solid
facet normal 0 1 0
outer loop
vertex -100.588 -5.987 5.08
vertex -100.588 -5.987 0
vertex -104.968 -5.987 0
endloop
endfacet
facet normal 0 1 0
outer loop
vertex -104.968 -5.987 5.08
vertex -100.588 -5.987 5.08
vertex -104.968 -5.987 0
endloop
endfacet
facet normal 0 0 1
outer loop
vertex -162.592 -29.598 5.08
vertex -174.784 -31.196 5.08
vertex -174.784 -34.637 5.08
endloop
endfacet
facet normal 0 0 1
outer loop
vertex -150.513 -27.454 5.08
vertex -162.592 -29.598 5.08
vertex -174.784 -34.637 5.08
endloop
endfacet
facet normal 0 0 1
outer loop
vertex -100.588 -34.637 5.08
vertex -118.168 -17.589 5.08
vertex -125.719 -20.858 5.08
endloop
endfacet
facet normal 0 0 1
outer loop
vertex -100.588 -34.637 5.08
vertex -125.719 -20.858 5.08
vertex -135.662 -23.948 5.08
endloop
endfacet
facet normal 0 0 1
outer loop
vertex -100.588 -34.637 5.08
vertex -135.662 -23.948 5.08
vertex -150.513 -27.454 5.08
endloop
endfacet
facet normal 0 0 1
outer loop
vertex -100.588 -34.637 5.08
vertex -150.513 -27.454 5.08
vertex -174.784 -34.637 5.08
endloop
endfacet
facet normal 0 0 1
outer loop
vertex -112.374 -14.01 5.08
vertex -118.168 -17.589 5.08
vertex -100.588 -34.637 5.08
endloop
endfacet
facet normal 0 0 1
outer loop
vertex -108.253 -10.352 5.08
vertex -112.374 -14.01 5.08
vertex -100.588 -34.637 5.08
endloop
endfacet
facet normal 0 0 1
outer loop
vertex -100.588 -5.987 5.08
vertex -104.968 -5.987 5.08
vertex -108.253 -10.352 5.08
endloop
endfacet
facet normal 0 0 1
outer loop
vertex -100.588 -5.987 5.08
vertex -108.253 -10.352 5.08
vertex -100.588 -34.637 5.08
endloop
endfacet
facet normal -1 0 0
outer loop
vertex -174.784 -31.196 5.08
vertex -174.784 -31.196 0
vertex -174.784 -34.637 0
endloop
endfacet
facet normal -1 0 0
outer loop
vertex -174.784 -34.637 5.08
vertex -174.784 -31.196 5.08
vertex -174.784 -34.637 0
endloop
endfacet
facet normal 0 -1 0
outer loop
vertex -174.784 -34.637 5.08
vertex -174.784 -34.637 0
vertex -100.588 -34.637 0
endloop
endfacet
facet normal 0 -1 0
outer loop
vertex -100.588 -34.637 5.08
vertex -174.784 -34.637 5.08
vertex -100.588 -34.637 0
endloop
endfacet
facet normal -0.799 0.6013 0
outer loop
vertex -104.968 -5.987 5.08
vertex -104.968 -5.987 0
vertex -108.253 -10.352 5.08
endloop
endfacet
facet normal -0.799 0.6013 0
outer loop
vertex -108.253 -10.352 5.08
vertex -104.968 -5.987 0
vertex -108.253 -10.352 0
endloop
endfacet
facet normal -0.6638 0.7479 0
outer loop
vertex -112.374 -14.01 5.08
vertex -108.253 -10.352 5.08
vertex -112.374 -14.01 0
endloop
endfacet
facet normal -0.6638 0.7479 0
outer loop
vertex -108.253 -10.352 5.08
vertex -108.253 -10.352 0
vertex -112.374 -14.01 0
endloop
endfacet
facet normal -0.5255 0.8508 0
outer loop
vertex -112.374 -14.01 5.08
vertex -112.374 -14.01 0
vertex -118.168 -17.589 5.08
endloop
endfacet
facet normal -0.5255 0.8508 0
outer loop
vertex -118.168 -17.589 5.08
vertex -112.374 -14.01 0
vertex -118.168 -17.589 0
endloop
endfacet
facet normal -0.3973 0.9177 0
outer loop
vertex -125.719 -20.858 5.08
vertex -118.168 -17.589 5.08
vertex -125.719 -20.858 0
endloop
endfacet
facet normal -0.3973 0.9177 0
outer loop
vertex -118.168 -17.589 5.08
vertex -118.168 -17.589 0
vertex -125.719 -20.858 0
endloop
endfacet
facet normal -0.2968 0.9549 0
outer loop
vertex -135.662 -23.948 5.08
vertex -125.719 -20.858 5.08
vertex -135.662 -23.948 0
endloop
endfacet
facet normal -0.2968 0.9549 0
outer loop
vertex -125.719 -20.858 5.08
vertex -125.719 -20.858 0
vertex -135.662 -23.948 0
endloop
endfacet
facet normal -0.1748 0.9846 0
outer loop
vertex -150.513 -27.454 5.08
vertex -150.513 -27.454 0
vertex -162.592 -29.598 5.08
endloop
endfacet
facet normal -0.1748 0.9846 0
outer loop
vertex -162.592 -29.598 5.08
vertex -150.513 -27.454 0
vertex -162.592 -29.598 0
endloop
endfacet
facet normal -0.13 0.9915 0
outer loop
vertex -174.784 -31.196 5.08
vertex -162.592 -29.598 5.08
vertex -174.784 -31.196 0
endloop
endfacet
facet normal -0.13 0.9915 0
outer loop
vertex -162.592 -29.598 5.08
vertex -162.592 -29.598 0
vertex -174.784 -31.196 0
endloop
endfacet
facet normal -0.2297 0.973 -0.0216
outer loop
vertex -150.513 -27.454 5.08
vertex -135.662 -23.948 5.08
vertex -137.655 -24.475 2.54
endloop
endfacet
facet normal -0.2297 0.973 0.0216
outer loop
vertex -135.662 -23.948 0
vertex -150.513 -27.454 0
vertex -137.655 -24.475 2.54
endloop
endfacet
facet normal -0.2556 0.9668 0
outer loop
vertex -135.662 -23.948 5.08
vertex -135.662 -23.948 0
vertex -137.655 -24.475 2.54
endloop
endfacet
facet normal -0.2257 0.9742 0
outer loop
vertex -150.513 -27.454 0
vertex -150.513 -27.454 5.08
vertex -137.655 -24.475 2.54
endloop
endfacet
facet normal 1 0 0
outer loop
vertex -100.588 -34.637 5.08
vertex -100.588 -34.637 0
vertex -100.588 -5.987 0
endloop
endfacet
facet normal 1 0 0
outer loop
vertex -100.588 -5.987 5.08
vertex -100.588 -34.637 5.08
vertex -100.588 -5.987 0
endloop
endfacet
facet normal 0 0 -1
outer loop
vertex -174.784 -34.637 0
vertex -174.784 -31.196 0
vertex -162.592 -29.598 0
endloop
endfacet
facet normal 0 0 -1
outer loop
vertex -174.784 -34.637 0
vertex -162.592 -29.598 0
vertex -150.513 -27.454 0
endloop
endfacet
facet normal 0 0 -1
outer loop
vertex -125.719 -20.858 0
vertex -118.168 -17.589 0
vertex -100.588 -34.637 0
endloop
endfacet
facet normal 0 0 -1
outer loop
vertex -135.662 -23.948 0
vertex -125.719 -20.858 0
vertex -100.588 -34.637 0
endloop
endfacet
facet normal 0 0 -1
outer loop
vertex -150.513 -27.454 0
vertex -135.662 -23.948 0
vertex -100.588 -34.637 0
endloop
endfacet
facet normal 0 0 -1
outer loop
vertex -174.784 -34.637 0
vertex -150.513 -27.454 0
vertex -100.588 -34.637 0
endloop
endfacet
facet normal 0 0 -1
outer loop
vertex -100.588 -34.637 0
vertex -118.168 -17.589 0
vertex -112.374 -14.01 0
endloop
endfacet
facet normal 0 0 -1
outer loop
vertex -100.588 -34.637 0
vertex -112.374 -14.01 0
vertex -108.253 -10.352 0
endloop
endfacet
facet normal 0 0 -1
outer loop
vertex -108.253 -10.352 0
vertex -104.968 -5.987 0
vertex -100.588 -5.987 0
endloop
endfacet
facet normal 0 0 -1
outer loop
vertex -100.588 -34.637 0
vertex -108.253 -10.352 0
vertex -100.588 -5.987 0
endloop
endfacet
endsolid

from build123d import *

# Parameters (mm, degrees)
F1_DEPTH = 5.08


with BuildPart() as f1:
    # F0 (on Top) → F1 (new body)
    with BuildSketch(Plane.XY):
        with BuildLine():
            Line((-174.7843325138, -31.1956964433), (-174.7843325138, -34.6367545426))
            Line((-174.7843325138, -34.6367545426), (-101.7393320799, -34.6367545426))
            Line((-101.7393320799, -34.6367545426), (-100.588105619, -34.6367545426))
            Line((-100.588105619, -34.6367545426), (-100.588105619, -5.986539647))
            Line((-100.588105619, -5.986539647), (-104.96840626, -5.986539647))
            add(Edge.make_bspline(
                [(-104.96840626, -5.986539647), (-111.2092956901, -16.541229561), (-138.6455943739, -25.7948594231), (-162.2404169958, -29.8019280524), (-174.7843325138, -31.1956964433)],
                knots=[0, 0, 0, 0, 0.4994028654, 1, 1, 1, 1], degree=3))
        make_face()
    extrude(amount=F1_DEPTH)


solid = f1.part
